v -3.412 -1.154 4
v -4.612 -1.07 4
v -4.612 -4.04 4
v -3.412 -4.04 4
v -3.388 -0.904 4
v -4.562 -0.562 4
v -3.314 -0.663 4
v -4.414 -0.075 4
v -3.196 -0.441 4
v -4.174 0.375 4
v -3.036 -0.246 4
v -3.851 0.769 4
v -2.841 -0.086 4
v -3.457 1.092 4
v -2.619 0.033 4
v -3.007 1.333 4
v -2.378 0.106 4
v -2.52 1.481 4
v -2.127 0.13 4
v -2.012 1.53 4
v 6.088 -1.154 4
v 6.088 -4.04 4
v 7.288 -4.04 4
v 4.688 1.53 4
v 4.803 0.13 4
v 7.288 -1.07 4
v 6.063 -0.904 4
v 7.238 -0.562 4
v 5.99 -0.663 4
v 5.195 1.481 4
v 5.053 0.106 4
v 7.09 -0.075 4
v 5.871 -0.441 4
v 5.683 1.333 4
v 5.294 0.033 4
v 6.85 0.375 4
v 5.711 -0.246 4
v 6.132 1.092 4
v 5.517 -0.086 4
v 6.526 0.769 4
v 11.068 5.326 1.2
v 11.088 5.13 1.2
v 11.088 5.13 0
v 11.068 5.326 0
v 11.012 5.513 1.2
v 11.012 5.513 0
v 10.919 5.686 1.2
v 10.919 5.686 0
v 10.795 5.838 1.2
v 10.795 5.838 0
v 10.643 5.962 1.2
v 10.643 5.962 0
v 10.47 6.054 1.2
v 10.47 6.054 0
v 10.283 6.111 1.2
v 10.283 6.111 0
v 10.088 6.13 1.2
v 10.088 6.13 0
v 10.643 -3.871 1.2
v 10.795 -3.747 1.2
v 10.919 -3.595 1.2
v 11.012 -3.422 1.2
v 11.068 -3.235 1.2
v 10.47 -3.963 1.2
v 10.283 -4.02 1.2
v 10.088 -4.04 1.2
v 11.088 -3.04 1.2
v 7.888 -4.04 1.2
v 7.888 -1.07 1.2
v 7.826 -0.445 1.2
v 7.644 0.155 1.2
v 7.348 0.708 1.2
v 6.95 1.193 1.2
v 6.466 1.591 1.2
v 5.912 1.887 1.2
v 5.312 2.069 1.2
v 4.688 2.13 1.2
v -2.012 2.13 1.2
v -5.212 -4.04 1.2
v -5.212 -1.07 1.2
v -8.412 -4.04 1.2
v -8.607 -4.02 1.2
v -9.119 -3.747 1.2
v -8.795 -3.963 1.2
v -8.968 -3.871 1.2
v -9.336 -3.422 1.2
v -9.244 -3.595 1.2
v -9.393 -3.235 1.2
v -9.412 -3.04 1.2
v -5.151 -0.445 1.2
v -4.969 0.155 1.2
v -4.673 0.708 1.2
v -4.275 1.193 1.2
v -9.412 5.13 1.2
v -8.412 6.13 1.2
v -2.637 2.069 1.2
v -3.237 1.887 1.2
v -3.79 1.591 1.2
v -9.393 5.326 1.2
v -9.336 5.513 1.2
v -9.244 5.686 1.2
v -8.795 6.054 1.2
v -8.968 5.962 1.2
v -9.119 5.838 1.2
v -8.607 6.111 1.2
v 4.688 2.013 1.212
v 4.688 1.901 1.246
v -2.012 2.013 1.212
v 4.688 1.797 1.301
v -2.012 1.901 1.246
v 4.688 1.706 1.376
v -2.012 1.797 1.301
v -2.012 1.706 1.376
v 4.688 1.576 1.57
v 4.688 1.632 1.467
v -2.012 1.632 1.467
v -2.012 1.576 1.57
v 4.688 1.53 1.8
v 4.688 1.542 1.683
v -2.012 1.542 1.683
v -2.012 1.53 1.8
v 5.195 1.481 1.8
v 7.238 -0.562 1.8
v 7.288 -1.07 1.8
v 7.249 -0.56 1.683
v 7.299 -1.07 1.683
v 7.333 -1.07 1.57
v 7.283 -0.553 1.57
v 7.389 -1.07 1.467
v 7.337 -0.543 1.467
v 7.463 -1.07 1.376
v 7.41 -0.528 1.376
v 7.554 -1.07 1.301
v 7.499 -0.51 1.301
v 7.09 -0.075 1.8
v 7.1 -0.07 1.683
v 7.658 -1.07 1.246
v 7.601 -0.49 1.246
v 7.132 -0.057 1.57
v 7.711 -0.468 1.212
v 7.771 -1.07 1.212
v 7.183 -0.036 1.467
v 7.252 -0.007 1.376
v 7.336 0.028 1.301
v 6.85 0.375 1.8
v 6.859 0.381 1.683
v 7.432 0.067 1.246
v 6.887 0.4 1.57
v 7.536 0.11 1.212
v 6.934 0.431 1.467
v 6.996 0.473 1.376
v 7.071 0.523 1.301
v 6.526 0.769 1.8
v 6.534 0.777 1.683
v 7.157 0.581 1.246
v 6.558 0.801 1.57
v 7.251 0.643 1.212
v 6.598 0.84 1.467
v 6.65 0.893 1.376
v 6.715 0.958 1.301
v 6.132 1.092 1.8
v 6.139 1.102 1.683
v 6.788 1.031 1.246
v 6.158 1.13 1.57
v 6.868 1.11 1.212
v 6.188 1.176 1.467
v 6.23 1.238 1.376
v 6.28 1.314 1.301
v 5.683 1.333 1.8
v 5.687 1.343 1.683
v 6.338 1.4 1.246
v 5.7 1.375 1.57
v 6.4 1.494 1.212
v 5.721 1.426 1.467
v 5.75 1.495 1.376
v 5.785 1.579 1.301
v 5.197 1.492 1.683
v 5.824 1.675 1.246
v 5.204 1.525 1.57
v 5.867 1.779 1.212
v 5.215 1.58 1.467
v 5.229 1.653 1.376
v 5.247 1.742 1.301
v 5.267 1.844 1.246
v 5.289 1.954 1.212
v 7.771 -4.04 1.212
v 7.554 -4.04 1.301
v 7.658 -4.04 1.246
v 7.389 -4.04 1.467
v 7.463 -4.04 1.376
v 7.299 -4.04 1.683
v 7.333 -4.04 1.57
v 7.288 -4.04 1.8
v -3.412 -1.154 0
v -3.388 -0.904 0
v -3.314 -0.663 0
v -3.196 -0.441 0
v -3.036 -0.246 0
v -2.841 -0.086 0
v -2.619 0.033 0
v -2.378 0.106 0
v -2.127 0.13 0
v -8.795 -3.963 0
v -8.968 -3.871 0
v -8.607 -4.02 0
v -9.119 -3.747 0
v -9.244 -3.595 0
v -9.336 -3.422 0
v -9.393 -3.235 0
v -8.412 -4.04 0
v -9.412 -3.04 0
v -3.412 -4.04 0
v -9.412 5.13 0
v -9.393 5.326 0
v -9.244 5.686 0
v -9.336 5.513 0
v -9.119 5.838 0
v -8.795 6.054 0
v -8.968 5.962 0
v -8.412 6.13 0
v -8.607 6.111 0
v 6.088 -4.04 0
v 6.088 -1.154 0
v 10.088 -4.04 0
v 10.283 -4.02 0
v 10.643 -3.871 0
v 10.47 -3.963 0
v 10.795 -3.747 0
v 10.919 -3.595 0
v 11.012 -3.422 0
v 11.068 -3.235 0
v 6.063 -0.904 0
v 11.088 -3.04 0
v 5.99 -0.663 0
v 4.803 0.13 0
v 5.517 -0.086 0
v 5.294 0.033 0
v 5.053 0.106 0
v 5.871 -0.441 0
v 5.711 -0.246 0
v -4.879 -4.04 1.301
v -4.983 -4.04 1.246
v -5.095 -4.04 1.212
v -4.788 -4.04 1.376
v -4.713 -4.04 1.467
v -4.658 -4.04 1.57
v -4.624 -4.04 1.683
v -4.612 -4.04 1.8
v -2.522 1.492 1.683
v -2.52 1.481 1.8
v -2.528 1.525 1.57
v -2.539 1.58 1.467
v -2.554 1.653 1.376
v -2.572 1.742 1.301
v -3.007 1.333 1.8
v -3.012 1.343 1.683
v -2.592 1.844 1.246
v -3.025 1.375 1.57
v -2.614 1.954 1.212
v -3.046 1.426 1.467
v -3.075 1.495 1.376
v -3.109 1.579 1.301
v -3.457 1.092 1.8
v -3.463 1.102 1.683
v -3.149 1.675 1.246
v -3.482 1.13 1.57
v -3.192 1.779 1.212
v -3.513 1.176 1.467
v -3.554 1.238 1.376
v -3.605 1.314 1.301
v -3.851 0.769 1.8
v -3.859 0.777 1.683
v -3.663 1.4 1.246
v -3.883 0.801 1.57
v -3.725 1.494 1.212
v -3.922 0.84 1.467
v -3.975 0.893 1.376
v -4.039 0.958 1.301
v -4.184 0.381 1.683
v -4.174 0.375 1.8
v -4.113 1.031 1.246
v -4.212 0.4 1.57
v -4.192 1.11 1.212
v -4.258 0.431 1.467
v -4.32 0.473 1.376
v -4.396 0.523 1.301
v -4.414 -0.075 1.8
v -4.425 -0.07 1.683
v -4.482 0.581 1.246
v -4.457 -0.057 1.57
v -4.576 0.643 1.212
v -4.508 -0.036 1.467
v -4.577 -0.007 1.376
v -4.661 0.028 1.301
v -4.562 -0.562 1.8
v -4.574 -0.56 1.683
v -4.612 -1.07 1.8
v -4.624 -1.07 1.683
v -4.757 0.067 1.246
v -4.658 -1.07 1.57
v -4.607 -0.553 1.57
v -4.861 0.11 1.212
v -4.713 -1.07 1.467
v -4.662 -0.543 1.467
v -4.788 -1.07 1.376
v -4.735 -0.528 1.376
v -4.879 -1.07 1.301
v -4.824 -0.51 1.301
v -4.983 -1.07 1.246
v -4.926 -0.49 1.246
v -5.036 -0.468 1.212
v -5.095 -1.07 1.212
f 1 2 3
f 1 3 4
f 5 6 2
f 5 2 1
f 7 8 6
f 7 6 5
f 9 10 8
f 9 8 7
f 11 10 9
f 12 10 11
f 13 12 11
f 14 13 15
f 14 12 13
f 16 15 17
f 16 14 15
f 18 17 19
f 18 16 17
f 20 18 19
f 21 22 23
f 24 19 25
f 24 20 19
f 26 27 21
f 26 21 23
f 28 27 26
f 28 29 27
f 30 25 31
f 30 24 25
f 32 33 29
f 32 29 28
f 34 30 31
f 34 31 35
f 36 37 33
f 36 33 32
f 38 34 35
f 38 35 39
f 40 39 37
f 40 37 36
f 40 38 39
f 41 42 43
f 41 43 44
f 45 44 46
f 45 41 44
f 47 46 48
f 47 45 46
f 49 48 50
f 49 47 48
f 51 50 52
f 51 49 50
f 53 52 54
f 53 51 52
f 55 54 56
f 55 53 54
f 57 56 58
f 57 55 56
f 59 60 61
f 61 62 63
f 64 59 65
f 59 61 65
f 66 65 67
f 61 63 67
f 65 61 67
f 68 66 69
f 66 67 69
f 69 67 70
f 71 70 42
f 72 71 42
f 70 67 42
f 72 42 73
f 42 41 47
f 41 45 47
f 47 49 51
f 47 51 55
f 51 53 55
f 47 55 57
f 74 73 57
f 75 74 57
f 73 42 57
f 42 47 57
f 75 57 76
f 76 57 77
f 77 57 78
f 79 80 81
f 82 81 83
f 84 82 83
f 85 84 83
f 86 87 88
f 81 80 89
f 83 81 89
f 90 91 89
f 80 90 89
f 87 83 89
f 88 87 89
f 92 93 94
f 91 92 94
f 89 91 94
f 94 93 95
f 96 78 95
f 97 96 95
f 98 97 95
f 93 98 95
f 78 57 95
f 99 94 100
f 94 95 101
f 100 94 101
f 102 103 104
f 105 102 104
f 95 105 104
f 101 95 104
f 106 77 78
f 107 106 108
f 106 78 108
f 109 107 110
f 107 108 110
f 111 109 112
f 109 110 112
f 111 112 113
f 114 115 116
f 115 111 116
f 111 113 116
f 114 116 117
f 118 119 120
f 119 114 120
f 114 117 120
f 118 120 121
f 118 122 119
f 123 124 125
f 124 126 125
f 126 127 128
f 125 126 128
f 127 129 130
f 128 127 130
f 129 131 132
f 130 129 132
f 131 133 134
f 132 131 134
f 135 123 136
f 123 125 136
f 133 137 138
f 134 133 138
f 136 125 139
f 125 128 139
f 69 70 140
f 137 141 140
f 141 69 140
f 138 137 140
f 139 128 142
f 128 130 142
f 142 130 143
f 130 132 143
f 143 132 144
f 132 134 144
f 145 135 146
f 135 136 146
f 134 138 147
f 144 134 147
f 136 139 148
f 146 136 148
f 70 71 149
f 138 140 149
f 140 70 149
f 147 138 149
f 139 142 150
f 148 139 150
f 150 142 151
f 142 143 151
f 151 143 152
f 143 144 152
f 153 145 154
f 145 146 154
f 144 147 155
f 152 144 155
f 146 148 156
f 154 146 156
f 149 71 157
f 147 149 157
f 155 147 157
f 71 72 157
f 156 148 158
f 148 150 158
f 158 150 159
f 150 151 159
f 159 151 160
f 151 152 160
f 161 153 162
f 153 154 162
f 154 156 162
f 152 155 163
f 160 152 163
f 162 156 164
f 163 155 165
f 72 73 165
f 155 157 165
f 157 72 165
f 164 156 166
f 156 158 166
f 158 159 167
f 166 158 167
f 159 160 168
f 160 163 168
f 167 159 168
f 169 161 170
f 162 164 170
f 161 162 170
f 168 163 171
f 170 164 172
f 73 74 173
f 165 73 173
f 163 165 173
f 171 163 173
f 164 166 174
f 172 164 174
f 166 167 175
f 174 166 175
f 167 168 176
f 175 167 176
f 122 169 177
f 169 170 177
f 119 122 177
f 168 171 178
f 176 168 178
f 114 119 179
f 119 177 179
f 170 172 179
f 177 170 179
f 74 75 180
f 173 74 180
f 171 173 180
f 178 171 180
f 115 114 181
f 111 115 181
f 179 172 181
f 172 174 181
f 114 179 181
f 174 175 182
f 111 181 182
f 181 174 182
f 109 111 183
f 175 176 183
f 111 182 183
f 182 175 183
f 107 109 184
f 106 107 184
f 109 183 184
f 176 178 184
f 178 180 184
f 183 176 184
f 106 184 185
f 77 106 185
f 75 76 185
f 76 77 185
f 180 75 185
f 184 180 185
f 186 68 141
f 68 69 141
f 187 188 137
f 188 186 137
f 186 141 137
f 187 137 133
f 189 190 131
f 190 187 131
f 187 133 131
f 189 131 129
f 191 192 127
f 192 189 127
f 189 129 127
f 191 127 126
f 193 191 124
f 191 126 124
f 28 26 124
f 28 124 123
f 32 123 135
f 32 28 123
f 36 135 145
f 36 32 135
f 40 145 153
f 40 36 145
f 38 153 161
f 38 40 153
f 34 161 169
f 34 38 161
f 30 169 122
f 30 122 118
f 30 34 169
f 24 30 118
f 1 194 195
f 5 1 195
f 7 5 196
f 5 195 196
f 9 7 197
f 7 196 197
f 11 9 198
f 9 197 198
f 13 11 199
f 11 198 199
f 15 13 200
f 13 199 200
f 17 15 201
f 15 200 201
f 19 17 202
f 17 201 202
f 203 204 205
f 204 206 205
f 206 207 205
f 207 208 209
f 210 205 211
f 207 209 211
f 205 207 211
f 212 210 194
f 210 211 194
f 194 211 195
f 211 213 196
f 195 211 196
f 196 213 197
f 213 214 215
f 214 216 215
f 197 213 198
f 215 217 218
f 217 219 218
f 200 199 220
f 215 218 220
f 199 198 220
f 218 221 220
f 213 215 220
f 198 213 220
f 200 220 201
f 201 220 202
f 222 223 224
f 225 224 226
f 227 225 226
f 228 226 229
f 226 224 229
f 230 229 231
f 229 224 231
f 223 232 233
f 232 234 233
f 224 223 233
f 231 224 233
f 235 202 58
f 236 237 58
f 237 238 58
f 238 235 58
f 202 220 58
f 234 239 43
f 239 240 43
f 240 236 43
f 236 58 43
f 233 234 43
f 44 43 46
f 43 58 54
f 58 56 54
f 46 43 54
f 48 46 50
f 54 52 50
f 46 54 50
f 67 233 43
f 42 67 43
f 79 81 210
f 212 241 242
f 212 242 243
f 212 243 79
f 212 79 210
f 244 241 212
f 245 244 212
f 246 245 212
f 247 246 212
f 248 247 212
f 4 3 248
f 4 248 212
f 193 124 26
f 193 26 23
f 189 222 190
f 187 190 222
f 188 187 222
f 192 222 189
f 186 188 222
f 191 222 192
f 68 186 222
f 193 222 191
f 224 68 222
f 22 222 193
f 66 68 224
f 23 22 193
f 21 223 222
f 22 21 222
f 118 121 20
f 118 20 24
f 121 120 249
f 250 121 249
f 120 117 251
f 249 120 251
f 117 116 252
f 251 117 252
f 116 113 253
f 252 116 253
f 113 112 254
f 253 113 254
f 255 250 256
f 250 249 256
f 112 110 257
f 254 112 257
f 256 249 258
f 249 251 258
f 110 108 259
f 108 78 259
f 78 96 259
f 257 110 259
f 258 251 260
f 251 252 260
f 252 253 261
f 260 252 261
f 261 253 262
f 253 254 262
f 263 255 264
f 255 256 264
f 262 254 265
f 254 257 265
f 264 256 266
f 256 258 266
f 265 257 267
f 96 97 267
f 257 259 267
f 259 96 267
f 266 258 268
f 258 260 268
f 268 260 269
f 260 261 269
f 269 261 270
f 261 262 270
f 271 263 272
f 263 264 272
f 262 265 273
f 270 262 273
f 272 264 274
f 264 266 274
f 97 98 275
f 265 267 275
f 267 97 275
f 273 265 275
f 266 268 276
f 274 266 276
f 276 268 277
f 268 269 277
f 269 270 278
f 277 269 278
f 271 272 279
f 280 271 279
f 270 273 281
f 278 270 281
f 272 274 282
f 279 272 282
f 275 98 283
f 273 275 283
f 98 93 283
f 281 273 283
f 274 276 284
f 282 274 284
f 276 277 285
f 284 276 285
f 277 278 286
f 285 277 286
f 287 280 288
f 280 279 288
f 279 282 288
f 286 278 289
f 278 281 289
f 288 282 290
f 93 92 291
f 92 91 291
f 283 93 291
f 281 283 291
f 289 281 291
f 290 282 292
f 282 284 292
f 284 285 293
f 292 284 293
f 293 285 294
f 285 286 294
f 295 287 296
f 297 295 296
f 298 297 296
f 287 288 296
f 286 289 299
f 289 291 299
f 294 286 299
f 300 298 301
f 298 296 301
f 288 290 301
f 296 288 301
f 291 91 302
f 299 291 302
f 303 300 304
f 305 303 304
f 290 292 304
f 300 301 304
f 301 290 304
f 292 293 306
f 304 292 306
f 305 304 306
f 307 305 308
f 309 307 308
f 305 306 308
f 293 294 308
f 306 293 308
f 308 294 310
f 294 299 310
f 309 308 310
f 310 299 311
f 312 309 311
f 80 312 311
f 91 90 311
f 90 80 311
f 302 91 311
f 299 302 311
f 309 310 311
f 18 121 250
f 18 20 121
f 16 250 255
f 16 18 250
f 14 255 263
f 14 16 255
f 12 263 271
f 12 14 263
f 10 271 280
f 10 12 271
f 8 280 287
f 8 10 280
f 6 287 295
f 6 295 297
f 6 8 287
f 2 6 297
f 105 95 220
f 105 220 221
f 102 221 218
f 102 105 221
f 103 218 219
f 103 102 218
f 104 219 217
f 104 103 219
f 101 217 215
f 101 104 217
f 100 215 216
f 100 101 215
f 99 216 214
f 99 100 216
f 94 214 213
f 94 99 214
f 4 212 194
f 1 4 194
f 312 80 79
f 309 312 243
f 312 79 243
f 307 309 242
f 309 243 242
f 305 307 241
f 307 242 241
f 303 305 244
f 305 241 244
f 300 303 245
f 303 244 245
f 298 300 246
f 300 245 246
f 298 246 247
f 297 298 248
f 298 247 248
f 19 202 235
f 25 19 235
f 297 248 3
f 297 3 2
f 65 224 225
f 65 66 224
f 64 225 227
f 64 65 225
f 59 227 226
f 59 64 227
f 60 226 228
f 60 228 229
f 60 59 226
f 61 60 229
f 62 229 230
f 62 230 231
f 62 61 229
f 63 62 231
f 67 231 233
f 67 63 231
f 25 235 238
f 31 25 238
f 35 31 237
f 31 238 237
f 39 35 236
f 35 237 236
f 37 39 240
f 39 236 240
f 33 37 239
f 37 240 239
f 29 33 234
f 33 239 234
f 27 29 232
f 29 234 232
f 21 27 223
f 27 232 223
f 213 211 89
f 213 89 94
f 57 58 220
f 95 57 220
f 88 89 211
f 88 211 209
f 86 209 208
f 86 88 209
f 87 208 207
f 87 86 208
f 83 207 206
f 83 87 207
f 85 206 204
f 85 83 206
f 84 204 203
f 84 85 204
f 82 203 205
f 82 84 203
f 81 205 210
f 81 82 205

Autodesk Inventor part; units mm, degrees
ref_plane "YZ Plane" through (0, 0, 0) normal (1, 0, 0) x (0, 1, 0)
ref_plane "XZ Plane" through (0, 0, 0) normal (0, 1, 0) x (-1, 0, 0)
ref_plane "XY Plane" through (0, 0, 0) normal (0, 0, 1) x (1, 0, 0)
sketch "Sketch1" plane through (0, 0, 0) normal (0, 0, 1) x (1, 0, 0)
  line L0 (-3.4123, 0.1305) -> (6.0877, 0.1305)
  line L1 (6.0877, 0.1305) -> (6.0877, -2.4395)
  line L2 (6.0877, -2.4395) -> (-3.4123, -2.4395)
  line L3 (-3.4123, -2.4395) -> (-3.4123, 0.1305)
  circle A0 centre (-2.1273, -1.1545) radius 1.285
  circle A1 centre (4.8027, -1.1545) radius 1.285
  line L4 (-4.6123, 1.5305) -> (7.2877, 1.5305)
  line L5 (7.2877, 1.5305) -> (7.2877, -2.4395)
  line L6 (7.2877, -2.4395) -> (-4.6123, -2.4395)
  line L7 (-4.6123, -2.4395) -> (-4.6123, 1.5305)
  point P0 (0, 0)
  point P1 (-3.4123, -2.4395)
  point P2 (-3.4123, -1.1545)
  point P3 (-2.1273, 0.1305)
  point P4 (4.8027, 0.1305)
  point P5 (6.0877, -1.1545)
  point P6 (6.0877, -2.4395)
  point P7 (4.8027, -2.4395)
  point P8 (-2.1273, -2.4395)
  dimension "d0" = 2.57
  dimension "d1" = 9.5
  dimension "d2" = 1.285
  dimension "d3" = 1.285
  dimension "d4" = 1.2
  dimension "d5" = 1.2
  dimension "d6" = 1.4
extrude "Extrusion1" add sketch "Sketch1" along normal blind 4 contours L3 L6 L7 L4 L5 L1 L0 | L0 A0 L3 | L0 L1 A1
sketch "Sketch2" plane through (0, 0, 0) normal (0, 0, -1) x (-1, 0, 0)
  line L0 (-6.0877, -2.4395) -> (-7.2877, -2.4395) projected
  line L1 (-11.0877, 6.1305) -> (-6.6877, 6.1305)
  line L2 (-6.6877, 6.1305) -> (-6.6877, -2.4395)
  line L3 (-6.6877, -2.4395) -> (-11.0877, -2.4395)
  line L4 (-11.0877, -2.4395) -> (-11.0877, 6.1305)
  line L5 (4.6123, -2.4395) -> (3.4123, -2.4395) projected
  line L6 (4.0123, -2.4395) -> (9.4123, -2.4395)
  line L7 (9.4123, -2.4395) -> (9.4123, 6.1305)
  line L8 (9.4123, 6.1305) -> (4.0123, 6.1305)
  line L9 (4.0123, 6.1305) -> (4.0123, -2.4395)
  line L10 (-7.2877, 1.5305) -> (4.6123, 1.5305) projected
  line L11 (-6.6877, 6.1305) -> (4.0123, 6.1305)
  line L12 (4.0123, 6.1305) -> (4.0123, 1.5305)
  line L13 (4.0123, 1.5305) -> (-6.6877, 1.5305)
  line L14 (-6.6877, 1.5305) -> (-6.6877, 6.1305)
  line L15 (-6.0877, -1.1545) -> (-6.0877, -2.4395) projected
  line L16 (3.4123, -2.4395) -> (3.4123, -1.1545) projected
  line L17 (2.1273, 0.1305) -> (-4.8027, 0.1305) projected
  point P0 (0, 0)
  point P1 (-6.6877, 1.5305)
  point P2 (4.6123, -2.4395)
  dimension "d9" = 5
  dimension "d10" = 6
  dimension "d11" = 6
extrude "Extrusion2" add sketch "Sketch2" against normal blind 1.2
fillet "Fillet1" radius 2.6 2 edges at (-4.6123, 1.5305, 2.6) (7.2877, 1.5305, 2.6)
sketch "Sketch3" plane through (-4.6123, -2.4395, 4) normal (0, -1, 0) x (1, 0, 0)
  line L0 (15.7, -2.8) -> (-4.8, -2.8) projected
  line L1 (1.2, -4) -> (1.2, 0) projected
  line L2 (-4.8, -2.8) -> (1.2, -2.8)
  line L3 (1.2, -2.8) -> (1.2, -4)
  line L4 (1.2, -4) -> (-4.8, -4)
  line L5 (-4.8, -4) -> (-4.8, -2.8)
  line L6 (0, -2.8) -> (0, 0) projected
  line L7 (0, 0) -> (1.2, 0)
  line L8 (1.2, 0) -> (1.2, -2.8)
  line L9 (1.2, -2.8) -> (0, -2.8)
  line L10 (0, -2.8) -> (0, 0)
  line L11 (11.9, -2.8) -> (11.9, 0) projected
  line L12 (10.7, -4) -> (10.7, 0) projected
  line L13 (11.9, 0) -> (10.7, 0)
  line L14 (10.7, 0) -> (10.7, -2.8)
  line L15 (10.7, -2.8) -> (11.9, -2.8)
  line L16 (11.9, -2.8) -> (11.9, 0)
  line L17 (15.7, -2.8) -> (10.7, -2.8)
  line L18 (10.7, -2.8) -> (10.7, -4)
  line L19 (10.7, -4) -> (15.7, -4)
  line L20 (15.7, -4) -> (15.7, -2.8)
  point P0 (4.6123, -4)
  point P1 (1.2, 0)
extrude "Extrusion3" add sketch "Sketch3" along normal blind 1.6
fillet "Fillet2" radius 0.6 5 edges at (6.5262, 0.769, 1.2) (1.3377, 1.5305, 1.2) (-3.8507, 0.769, 1.2) (-4.6123, -2.5545, 1.2) (7.2877, -2.5545, 1.2)
fillet "Fillet3" radius 1 4 edges at (-9.4123, -4.0395, 0.6) (-9.4123, 6.1305, 0.6) (11.0877, 6.1305, 0.6) (11.0877, -4.0395, 0.6)
properties part number "charge_support"
